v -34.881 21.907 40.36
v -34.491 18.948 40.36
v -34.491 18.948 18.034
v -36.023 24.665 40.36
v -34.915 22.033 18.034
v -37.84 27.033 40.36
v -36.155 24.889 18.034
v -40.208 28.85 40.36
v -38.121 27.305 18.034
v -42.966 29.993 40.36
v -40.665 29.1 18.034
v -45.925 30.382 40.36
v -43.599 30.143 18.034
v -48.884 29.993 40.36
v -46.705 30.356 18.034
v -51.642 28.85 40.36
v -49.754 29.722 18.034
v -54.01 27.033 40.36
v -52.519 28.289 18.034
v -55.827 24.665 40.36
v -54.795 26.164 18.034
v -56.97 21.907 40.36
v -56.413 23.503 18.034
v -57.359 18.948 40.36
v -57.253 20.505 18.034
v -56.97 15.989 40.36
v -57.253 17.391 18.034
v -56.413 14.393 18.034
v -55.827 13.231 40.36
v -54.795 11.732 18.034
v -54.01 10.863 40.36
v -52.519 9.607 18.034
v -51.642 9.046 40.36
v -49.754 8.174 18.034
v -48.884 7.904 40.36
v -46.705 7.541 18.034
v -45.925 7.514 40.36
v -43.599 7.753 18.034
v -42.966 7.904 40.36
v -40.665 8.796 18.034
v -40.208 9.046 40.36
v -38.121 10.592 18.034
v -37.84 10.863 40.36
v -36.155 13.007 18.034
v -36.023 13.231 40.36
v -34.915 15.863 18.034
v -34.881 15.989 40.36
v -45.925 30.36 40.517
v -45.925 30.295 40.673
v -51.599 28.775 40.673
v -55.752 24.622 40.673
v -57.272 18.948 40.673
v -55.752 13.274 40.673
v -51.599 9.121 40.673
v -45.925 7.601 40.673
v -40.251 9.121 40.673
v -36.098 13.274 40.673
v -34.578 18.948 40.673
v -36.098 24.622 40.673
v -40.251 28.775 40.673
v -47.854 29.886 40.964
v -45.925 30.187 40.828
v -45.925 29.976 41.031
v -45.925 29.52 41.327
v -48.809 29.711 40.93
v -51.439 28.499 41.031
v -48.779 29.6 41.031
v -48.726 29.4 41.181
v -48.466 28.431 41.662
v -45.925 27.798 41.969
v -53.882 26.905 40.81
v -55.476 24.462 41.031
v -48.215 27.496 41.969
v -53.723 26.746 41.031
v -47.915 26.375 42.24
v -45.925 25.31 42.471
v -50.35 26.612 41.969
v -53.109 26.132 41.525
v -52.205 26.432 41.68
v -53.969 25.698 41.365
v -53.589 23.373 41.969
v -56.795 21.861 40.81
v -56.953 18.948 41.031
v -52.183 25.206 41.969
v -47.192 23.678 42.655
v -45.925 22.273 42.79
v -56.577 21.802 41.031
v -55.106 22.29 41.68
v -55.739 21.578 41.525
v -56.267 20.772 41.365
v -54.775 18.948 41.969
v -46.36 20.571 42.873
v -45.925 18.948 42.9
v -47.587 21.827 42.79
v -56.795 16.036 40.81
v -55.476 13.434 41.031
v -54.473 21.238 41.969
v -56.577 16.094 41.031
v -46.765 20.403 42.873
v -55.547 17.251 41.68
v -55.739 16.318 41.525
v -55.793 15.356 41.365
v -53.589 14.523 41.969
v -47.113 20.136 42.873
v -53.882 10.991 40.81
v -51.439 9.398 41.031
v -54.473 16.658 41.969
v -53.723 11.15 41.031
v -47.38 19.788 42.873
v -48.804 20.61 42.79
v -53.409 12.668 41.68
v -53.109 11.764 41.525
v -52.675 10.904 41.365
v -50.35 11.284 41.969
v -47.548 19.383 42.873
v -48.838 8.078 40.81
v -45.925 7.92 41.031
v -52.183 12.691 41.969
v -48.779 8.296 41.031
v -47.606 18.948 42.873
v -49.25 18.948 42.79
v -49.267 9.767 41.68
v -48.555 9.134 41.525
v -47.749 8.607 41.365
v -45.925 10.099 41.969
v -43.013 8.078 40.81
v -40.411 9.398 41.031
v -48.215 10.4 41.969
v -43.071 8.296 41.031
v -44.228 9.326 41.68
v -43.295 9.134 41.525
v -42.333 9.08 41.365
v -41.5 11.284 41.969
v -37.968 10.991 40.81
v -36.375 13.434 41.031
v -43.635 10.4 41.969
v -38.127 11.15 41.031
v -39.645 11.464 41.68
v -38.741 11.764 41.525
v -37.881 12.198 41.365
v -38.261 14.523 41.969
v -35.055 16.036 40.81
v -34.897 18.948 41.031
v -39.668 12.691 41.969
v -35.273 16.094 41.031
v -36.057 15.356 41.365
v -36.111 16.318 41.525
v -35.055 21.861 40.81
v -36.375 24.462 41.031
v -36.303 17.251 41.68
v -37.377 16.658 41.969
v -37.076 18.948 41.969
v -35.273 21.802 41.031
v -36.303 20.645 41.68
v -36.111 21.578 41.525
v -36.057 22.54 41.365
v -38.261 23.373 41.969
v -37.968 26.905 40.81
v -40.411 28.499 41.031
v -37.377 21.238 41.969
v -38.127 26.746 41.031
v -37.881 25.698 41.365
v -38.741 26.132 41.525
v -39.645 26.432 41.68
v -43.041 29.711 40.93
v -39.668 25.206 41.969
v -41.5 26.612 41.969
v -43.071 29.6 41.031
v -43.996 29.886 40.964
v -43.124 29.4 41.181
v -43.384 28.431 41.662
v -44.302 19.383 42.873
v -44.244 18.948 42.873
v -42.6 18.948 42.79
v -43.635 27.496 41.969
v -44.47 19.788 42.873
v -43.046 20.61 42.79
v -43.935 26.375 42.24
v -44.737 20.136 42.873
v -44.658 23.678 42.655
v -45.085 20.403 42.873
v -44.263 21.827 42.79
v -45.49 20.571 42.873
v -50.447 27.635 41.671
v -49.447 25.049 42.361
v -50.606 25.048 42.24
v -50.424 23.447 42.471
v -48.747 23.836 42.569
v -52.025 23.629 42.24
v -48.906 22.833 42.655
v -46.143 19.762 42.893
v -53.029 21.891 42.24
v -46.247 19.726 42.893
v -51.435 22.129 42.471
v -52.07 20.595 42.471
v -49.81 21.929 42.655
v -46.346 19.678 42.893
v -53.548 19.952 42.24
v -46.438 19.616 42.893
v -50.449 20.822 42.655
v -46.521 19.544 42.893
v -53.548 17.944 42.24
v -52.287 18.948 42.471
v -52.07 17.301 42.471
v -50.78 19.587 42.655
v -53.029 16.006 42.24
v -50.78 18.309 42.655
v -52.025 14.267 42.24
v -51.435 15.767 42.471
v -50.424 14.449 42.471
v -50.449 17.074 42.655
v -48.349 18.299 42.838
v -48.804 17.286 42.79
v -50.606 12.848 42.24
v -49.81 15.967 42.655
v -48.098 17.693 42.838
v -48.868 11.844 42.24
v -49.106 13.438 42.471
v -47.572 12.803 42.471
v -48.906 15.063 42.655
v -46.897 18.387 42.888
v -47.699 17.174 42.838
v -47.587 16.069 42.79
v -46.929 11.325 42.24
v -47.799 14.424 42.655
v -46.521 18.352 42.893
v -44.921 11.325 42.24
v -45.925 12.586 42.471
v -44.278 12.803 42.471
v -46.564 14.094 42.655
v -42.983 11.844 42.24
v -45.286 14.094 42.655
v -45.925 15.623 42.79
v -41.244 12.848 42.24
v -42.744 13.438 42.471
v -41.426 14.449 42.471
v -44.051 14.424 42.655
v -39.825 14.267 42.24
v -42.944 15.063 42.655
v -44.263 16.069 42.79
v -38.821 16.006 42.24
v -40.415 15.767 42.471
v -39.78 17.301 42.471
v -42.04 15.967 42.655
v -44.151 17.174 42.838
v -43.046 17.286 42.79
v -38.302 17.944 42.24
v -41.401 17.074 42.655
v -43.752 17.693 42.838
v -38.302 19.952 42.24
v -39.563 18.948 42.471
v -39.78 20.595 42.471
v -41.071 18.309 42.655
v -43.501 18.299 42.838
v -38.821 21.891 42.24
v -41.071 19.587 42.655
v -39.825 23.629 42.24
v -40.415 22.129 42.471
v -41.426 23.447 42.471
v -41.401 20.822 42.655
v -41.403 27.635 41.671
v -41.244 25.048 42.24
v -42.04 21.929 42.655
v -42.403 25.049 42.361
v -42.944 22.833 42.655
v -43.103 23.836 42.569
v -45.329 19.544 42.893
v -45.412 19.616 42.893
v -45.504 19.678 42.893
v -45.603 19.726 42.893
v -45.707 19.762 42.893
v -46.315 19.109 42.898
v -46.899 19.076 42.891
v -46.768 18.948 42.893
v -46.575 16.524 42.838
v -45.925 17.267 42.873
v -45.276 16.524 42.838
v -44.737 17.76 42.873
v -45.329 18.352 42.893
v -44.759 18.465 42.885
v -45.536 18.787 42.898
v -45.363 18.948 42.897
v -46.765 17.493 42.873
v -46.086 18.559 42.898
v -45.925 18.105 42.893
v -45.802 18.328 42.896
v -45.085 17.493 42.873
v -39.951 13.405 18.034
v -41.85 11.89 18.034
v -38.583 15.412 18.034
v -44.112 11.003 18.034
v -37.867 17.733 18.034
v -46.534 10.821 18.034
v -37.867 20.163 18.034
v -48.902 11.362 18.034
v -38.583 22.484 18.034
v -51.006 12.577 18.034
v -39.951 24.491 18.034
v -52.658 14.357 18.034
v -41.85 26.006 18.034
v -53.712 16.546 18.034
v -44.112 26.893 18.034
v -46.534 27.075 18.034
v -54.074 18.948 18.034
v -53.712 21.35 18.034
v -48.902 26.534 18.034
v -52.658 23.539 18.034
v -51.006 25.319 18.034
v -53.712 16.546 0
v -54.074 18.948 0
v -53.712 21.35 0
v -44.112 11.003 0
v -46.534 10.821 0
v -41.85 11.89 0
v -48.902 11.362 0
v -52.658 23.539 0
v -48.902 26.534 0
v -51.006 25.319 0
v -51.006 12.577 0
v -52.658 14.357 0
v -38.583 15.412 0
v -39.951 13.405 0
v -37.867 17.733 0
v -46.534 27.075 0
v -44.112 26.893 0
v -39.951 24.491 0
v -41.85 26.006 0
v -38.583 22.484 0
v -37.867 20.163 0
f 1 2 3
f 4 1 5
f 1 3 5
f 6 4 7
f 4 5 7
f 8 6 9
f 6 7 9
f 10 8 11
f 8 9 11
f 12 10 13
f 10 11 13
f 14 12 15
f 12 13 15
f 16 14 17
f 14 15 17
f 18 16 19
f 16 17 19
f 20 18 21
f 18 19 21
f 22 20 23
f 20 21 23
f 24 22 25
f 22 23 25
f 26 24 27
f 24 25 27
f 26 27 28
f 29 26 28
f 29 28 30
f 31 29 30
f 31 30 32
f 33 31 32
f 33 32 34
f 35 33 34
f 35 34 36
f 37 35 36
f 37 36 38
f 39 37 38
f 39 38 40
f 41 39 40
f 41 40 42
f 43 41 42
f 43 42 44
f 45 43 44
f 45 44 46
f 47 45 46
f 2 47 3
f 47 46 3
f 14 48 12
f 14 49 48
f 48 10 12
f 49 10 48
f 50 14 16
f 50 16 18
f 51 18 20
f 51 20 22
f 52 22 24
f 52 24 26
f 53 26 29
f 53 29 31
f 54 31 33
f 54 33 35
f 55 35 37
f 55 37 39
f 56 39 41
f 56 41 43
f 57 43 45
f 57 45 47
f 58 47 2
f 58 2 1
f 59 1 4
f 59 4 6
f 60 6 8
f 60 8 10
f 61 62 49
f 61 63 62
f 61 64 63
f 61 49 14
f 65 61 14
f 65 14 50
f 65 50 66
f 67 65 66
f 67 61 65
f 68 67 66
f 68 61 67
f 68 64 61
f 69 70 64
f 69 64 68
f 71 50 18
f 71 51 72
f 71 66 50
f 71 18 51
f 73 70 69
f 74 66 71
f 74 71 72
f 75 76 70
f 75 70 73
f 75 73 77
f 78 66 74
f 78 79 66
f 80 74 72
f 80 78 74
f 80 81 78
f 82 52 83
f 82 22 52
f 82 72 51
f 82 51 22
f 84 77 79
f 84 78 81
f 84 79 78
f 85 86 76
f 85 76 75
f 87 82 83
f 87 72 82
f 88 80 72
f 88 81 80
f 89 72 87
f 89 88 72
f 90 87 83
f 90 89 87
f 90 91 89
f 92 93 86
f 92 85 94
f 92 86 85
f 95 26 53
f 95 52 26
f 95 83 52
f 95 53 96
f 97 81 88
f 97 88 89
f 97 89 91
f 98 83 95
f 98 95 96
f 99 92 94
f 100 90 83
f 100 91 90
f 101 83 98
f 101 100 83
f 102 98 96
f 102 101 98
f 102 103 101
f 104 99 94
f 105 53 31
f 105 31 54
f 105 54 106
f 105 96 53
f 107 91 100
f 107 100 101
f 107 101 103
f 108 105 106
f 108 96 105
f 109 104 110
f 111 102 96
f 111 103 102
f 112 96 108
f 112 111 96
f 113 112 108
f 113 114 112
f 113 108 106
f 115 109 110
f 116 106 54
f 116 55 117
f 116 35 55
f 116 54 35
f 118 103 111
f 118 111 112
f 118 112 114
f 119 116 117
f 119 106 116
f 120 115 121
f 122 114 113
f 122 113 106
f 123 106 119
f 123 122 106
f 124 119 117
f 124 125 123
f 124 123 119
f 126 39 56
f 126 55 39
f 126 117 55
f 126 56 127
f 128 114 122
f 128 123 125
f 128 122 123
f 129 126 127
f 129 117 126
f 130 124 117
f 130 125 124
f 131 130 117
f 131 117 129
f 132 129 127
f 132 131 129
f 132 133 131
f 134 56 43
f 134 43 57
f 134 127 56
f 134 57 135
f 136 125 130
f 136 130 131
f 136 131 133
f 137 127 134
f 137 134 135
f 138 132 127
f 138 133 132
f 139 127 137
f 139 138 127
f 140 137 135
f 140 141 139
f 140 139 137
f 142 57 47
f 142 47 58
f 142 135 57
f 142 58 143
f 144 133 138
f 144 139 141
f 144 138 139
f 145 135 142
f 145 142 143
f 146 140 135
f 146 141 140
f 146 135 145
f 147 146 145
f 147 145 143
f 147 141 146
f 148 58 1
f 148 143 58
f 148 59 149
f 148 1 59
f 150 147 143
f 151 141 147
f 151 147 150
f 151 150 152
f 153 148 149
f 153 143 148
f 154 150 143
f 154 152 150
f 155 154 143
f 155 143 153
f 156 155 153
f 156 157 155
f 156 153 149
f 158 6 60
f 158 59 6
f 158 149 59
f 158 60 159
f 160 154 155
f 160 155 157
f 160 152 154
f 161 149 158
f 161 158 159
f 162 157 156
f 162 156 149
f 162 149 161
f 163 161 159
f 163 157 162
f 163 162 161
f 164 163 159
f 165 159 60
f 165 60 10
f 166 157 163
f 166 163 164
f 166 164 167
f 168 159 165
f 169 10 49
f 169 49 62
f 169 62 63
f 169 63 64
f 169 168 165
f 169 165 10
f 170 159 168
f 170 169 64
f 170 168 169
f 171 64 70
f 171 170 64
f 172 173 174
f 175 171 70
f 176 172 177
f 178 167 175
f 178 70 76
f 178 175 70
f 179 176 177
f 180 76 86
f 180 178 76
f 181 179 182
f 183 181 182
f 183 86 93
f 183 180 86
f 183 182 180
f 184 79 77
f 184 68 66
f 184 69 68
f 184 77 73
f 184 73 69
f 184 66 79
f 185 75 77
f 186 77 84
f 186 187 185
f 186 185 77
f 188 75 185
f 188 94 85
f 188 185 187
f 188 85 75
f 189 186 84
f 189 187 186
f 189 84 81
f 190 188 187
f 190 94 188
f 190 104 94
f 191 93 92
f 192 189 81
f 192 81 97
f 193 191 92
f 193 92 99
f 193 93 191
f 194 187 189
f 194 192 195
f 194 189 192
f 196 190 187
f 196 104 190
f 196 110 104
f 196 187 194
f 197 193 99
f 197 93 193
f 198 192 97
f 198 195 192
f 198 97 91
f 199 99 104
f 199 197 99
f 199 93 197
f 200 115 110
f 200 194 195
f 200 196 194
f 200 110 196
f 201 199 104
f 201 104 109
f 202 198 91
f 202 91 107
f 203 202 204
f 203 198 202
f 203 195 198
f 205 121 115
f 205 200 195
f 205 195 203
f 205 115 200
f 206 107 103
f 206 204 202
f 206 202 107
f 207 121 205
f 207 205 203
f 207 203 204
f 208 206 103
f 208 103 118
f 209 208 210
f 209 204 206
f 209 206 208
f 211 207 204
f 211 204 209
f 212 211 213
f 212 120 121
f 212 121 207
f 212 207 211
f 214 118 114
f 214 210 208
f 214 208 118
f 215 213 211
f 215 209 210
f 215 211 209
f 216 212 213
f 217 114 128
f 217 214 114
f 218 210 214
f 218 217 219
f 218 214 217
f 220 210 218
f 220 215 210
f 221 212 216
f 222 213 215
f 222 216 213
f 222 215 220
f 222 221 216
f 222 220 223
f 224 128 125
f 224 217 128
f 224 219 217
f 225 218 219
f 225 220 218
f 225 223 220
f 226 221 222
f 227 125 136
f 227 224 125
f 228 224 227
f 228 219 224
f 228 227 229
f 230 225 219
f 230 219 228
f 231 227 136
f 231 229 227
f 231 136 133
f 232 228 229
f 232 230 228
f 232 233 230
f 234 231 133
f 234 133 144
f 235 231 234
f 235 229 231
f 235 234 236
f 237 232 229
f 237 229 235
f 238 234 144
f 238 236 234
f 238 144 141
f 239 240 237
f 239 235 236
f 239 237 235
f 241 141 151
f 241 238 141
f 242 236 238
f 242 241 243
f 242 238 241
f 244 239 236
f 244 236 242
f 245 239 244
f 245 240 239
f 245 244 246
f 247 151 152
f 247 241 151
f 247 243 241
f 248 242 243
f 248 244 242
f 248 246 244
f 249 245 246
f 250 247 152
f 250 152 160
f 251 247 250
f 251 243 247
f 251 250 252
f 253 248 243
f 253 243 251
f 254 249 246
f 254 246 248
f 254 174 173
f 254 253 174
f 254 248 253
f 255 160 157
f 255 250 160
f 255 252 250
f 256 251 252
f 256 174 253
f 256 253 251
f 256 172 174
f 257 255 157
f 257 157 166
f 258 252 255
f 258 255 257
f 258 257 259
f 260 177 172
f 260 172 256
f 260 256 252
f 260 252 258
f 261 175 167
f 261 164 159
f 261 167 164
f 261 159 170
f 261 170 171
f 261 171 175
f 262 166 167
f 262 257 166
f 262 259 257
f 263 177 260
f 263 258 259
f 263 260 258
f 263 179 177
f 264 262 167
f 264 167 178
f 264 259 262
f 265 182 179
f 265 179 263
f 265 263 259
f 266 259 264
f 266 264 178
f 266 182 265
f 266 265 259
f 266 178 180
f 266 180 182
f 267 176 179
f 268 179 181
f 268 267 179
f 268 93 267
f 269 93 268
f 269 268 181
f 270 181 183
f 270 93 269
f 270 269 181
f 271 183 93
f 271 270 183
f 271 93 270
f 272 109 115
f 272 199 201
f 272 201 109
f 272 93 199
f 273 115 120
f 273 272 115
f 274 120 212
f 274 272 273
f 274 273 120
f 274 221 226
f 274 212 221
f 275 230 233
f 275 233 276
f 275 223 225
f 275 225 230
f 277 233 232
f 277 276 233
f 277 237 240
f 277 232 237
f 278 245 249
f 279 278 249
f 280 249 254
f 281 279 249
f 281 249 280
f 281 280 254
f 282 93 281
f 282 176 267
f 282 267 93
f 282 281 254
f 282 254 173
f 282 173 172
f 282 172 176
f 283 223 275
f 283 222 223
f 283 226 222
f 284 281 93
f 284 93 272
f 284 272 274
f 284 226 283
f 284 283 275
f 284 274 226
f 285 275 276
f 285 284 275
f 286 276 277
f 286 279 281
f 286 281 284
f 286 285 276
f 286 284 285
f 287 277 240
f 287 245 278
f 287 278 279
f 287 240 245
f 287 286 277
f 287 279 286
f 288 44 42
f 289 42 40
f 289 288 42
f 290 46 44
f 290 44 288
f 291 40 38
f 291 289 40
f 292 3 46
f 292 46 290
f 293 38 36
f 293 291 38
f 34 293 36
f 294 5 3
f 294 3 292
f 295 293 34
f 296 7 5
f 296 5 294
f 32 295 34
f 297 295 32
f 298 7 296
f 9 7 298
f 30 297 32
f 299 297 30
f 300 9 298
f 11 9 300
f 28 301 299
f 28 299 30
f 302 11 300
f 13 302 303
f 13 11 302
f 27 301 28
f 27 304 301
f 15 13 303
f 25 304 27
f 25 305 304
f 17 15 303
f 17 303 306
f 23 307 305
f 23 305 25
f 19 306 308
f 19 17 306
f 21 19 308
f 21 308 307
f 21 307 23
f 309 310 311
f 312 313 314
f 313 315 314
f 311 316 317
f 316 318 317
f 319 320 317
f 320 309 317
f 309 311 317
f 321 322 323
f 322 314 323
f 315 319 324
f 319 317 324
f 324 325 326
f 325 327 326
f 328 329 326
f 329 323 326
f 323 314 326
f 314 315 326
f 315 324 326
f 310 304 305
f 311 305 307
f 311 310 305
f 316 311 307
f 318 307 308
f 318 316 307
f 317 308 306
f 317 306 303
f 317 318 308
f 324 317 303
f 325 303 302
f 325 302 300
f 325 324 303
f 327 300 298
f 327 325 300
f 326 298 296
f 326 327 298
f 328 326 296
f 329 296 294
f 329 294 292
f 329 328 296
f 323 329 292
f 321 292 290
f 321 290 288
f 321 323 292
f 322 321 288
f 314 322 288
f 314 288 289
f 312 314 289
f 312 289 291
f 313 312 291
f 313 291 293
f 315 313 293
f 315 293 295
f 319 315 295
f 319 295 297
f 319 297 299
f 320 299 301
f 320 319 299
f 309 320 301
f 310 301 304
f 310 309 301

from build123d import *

# Parameters (mm, degrees)
SKETCH1_R          = 11.43413059
BASE_EXTRUDE_DEPTH = 40.360136162
DOME1_FACE_RADIUS  = 11.43413059
DOME1_HEIGHT       = 2.54
SKETCH2_OUTSIDE_W  = 35.612
SKETCH2_OUTSIDE_H  = 35.612
SKETCH2_OUTSIDE_R  = 8.14940086
CUT_EXTRUDE1_DEPTH = 18.034


with BuildPart() as part:
    # Sketch1 → Base-Extrude (new body)
    with BuildSketch(Plane.XY):
        with Locations((-45.925033829, 18.948035519)):
            Circle(SKETCH1_R)
    extrude(amount=BASE_EXTRUDE_DEPTH)

    # Dome1: an elliptical dome of height H over a round flat face of radius A is half a spheroid: the quarter ellipse of half axes A and H revolved about the face's axis
    with BuildSketch(Plane((-45.925033829, 18.948035519, 40.360136162), x_dir=(0, 1, 0), z_dir=(1, 0, 0)), mode=Mode.PRIVATE) as dome1_quarter:
        Ellipse(DOME1_FACE_RADIUS, DOME1_HEIGHT)
        Rectangle(DOME1_FACE_RADIUS, DOME1_HEIGHT, align=(Align.MIN, Align.MIN), mode=Mode.INTERSECT)
    revolve(dome1_quarter.sketch, axis=Axis((-45.925033829, 18.948035519, 40.360136162), (0, 0, 1)))

    # Sketch2 outside → Cut-Extrude1 (cut)
    with BuildSketch(Plane(origin=(0, 0, 0), x_dir=(-1, 0, 0), z_dir=(0, 0, -1))):
        with Locations((45.925, 18.948)):
            Rectangle(SKETCH2_OUTSIDE_W, SKETCH2_OUTSIDE_H)
        with Locations((45.925033829, 18.948035519)):
            Circle(SKETCH2_OUTSIDE_R, mode=Mode.SUBTRACT)
    extrude(amount=-CUT_EXTRUDE1_DEPTH, mode=Mode.SUBTRACT)


solid = part.part
